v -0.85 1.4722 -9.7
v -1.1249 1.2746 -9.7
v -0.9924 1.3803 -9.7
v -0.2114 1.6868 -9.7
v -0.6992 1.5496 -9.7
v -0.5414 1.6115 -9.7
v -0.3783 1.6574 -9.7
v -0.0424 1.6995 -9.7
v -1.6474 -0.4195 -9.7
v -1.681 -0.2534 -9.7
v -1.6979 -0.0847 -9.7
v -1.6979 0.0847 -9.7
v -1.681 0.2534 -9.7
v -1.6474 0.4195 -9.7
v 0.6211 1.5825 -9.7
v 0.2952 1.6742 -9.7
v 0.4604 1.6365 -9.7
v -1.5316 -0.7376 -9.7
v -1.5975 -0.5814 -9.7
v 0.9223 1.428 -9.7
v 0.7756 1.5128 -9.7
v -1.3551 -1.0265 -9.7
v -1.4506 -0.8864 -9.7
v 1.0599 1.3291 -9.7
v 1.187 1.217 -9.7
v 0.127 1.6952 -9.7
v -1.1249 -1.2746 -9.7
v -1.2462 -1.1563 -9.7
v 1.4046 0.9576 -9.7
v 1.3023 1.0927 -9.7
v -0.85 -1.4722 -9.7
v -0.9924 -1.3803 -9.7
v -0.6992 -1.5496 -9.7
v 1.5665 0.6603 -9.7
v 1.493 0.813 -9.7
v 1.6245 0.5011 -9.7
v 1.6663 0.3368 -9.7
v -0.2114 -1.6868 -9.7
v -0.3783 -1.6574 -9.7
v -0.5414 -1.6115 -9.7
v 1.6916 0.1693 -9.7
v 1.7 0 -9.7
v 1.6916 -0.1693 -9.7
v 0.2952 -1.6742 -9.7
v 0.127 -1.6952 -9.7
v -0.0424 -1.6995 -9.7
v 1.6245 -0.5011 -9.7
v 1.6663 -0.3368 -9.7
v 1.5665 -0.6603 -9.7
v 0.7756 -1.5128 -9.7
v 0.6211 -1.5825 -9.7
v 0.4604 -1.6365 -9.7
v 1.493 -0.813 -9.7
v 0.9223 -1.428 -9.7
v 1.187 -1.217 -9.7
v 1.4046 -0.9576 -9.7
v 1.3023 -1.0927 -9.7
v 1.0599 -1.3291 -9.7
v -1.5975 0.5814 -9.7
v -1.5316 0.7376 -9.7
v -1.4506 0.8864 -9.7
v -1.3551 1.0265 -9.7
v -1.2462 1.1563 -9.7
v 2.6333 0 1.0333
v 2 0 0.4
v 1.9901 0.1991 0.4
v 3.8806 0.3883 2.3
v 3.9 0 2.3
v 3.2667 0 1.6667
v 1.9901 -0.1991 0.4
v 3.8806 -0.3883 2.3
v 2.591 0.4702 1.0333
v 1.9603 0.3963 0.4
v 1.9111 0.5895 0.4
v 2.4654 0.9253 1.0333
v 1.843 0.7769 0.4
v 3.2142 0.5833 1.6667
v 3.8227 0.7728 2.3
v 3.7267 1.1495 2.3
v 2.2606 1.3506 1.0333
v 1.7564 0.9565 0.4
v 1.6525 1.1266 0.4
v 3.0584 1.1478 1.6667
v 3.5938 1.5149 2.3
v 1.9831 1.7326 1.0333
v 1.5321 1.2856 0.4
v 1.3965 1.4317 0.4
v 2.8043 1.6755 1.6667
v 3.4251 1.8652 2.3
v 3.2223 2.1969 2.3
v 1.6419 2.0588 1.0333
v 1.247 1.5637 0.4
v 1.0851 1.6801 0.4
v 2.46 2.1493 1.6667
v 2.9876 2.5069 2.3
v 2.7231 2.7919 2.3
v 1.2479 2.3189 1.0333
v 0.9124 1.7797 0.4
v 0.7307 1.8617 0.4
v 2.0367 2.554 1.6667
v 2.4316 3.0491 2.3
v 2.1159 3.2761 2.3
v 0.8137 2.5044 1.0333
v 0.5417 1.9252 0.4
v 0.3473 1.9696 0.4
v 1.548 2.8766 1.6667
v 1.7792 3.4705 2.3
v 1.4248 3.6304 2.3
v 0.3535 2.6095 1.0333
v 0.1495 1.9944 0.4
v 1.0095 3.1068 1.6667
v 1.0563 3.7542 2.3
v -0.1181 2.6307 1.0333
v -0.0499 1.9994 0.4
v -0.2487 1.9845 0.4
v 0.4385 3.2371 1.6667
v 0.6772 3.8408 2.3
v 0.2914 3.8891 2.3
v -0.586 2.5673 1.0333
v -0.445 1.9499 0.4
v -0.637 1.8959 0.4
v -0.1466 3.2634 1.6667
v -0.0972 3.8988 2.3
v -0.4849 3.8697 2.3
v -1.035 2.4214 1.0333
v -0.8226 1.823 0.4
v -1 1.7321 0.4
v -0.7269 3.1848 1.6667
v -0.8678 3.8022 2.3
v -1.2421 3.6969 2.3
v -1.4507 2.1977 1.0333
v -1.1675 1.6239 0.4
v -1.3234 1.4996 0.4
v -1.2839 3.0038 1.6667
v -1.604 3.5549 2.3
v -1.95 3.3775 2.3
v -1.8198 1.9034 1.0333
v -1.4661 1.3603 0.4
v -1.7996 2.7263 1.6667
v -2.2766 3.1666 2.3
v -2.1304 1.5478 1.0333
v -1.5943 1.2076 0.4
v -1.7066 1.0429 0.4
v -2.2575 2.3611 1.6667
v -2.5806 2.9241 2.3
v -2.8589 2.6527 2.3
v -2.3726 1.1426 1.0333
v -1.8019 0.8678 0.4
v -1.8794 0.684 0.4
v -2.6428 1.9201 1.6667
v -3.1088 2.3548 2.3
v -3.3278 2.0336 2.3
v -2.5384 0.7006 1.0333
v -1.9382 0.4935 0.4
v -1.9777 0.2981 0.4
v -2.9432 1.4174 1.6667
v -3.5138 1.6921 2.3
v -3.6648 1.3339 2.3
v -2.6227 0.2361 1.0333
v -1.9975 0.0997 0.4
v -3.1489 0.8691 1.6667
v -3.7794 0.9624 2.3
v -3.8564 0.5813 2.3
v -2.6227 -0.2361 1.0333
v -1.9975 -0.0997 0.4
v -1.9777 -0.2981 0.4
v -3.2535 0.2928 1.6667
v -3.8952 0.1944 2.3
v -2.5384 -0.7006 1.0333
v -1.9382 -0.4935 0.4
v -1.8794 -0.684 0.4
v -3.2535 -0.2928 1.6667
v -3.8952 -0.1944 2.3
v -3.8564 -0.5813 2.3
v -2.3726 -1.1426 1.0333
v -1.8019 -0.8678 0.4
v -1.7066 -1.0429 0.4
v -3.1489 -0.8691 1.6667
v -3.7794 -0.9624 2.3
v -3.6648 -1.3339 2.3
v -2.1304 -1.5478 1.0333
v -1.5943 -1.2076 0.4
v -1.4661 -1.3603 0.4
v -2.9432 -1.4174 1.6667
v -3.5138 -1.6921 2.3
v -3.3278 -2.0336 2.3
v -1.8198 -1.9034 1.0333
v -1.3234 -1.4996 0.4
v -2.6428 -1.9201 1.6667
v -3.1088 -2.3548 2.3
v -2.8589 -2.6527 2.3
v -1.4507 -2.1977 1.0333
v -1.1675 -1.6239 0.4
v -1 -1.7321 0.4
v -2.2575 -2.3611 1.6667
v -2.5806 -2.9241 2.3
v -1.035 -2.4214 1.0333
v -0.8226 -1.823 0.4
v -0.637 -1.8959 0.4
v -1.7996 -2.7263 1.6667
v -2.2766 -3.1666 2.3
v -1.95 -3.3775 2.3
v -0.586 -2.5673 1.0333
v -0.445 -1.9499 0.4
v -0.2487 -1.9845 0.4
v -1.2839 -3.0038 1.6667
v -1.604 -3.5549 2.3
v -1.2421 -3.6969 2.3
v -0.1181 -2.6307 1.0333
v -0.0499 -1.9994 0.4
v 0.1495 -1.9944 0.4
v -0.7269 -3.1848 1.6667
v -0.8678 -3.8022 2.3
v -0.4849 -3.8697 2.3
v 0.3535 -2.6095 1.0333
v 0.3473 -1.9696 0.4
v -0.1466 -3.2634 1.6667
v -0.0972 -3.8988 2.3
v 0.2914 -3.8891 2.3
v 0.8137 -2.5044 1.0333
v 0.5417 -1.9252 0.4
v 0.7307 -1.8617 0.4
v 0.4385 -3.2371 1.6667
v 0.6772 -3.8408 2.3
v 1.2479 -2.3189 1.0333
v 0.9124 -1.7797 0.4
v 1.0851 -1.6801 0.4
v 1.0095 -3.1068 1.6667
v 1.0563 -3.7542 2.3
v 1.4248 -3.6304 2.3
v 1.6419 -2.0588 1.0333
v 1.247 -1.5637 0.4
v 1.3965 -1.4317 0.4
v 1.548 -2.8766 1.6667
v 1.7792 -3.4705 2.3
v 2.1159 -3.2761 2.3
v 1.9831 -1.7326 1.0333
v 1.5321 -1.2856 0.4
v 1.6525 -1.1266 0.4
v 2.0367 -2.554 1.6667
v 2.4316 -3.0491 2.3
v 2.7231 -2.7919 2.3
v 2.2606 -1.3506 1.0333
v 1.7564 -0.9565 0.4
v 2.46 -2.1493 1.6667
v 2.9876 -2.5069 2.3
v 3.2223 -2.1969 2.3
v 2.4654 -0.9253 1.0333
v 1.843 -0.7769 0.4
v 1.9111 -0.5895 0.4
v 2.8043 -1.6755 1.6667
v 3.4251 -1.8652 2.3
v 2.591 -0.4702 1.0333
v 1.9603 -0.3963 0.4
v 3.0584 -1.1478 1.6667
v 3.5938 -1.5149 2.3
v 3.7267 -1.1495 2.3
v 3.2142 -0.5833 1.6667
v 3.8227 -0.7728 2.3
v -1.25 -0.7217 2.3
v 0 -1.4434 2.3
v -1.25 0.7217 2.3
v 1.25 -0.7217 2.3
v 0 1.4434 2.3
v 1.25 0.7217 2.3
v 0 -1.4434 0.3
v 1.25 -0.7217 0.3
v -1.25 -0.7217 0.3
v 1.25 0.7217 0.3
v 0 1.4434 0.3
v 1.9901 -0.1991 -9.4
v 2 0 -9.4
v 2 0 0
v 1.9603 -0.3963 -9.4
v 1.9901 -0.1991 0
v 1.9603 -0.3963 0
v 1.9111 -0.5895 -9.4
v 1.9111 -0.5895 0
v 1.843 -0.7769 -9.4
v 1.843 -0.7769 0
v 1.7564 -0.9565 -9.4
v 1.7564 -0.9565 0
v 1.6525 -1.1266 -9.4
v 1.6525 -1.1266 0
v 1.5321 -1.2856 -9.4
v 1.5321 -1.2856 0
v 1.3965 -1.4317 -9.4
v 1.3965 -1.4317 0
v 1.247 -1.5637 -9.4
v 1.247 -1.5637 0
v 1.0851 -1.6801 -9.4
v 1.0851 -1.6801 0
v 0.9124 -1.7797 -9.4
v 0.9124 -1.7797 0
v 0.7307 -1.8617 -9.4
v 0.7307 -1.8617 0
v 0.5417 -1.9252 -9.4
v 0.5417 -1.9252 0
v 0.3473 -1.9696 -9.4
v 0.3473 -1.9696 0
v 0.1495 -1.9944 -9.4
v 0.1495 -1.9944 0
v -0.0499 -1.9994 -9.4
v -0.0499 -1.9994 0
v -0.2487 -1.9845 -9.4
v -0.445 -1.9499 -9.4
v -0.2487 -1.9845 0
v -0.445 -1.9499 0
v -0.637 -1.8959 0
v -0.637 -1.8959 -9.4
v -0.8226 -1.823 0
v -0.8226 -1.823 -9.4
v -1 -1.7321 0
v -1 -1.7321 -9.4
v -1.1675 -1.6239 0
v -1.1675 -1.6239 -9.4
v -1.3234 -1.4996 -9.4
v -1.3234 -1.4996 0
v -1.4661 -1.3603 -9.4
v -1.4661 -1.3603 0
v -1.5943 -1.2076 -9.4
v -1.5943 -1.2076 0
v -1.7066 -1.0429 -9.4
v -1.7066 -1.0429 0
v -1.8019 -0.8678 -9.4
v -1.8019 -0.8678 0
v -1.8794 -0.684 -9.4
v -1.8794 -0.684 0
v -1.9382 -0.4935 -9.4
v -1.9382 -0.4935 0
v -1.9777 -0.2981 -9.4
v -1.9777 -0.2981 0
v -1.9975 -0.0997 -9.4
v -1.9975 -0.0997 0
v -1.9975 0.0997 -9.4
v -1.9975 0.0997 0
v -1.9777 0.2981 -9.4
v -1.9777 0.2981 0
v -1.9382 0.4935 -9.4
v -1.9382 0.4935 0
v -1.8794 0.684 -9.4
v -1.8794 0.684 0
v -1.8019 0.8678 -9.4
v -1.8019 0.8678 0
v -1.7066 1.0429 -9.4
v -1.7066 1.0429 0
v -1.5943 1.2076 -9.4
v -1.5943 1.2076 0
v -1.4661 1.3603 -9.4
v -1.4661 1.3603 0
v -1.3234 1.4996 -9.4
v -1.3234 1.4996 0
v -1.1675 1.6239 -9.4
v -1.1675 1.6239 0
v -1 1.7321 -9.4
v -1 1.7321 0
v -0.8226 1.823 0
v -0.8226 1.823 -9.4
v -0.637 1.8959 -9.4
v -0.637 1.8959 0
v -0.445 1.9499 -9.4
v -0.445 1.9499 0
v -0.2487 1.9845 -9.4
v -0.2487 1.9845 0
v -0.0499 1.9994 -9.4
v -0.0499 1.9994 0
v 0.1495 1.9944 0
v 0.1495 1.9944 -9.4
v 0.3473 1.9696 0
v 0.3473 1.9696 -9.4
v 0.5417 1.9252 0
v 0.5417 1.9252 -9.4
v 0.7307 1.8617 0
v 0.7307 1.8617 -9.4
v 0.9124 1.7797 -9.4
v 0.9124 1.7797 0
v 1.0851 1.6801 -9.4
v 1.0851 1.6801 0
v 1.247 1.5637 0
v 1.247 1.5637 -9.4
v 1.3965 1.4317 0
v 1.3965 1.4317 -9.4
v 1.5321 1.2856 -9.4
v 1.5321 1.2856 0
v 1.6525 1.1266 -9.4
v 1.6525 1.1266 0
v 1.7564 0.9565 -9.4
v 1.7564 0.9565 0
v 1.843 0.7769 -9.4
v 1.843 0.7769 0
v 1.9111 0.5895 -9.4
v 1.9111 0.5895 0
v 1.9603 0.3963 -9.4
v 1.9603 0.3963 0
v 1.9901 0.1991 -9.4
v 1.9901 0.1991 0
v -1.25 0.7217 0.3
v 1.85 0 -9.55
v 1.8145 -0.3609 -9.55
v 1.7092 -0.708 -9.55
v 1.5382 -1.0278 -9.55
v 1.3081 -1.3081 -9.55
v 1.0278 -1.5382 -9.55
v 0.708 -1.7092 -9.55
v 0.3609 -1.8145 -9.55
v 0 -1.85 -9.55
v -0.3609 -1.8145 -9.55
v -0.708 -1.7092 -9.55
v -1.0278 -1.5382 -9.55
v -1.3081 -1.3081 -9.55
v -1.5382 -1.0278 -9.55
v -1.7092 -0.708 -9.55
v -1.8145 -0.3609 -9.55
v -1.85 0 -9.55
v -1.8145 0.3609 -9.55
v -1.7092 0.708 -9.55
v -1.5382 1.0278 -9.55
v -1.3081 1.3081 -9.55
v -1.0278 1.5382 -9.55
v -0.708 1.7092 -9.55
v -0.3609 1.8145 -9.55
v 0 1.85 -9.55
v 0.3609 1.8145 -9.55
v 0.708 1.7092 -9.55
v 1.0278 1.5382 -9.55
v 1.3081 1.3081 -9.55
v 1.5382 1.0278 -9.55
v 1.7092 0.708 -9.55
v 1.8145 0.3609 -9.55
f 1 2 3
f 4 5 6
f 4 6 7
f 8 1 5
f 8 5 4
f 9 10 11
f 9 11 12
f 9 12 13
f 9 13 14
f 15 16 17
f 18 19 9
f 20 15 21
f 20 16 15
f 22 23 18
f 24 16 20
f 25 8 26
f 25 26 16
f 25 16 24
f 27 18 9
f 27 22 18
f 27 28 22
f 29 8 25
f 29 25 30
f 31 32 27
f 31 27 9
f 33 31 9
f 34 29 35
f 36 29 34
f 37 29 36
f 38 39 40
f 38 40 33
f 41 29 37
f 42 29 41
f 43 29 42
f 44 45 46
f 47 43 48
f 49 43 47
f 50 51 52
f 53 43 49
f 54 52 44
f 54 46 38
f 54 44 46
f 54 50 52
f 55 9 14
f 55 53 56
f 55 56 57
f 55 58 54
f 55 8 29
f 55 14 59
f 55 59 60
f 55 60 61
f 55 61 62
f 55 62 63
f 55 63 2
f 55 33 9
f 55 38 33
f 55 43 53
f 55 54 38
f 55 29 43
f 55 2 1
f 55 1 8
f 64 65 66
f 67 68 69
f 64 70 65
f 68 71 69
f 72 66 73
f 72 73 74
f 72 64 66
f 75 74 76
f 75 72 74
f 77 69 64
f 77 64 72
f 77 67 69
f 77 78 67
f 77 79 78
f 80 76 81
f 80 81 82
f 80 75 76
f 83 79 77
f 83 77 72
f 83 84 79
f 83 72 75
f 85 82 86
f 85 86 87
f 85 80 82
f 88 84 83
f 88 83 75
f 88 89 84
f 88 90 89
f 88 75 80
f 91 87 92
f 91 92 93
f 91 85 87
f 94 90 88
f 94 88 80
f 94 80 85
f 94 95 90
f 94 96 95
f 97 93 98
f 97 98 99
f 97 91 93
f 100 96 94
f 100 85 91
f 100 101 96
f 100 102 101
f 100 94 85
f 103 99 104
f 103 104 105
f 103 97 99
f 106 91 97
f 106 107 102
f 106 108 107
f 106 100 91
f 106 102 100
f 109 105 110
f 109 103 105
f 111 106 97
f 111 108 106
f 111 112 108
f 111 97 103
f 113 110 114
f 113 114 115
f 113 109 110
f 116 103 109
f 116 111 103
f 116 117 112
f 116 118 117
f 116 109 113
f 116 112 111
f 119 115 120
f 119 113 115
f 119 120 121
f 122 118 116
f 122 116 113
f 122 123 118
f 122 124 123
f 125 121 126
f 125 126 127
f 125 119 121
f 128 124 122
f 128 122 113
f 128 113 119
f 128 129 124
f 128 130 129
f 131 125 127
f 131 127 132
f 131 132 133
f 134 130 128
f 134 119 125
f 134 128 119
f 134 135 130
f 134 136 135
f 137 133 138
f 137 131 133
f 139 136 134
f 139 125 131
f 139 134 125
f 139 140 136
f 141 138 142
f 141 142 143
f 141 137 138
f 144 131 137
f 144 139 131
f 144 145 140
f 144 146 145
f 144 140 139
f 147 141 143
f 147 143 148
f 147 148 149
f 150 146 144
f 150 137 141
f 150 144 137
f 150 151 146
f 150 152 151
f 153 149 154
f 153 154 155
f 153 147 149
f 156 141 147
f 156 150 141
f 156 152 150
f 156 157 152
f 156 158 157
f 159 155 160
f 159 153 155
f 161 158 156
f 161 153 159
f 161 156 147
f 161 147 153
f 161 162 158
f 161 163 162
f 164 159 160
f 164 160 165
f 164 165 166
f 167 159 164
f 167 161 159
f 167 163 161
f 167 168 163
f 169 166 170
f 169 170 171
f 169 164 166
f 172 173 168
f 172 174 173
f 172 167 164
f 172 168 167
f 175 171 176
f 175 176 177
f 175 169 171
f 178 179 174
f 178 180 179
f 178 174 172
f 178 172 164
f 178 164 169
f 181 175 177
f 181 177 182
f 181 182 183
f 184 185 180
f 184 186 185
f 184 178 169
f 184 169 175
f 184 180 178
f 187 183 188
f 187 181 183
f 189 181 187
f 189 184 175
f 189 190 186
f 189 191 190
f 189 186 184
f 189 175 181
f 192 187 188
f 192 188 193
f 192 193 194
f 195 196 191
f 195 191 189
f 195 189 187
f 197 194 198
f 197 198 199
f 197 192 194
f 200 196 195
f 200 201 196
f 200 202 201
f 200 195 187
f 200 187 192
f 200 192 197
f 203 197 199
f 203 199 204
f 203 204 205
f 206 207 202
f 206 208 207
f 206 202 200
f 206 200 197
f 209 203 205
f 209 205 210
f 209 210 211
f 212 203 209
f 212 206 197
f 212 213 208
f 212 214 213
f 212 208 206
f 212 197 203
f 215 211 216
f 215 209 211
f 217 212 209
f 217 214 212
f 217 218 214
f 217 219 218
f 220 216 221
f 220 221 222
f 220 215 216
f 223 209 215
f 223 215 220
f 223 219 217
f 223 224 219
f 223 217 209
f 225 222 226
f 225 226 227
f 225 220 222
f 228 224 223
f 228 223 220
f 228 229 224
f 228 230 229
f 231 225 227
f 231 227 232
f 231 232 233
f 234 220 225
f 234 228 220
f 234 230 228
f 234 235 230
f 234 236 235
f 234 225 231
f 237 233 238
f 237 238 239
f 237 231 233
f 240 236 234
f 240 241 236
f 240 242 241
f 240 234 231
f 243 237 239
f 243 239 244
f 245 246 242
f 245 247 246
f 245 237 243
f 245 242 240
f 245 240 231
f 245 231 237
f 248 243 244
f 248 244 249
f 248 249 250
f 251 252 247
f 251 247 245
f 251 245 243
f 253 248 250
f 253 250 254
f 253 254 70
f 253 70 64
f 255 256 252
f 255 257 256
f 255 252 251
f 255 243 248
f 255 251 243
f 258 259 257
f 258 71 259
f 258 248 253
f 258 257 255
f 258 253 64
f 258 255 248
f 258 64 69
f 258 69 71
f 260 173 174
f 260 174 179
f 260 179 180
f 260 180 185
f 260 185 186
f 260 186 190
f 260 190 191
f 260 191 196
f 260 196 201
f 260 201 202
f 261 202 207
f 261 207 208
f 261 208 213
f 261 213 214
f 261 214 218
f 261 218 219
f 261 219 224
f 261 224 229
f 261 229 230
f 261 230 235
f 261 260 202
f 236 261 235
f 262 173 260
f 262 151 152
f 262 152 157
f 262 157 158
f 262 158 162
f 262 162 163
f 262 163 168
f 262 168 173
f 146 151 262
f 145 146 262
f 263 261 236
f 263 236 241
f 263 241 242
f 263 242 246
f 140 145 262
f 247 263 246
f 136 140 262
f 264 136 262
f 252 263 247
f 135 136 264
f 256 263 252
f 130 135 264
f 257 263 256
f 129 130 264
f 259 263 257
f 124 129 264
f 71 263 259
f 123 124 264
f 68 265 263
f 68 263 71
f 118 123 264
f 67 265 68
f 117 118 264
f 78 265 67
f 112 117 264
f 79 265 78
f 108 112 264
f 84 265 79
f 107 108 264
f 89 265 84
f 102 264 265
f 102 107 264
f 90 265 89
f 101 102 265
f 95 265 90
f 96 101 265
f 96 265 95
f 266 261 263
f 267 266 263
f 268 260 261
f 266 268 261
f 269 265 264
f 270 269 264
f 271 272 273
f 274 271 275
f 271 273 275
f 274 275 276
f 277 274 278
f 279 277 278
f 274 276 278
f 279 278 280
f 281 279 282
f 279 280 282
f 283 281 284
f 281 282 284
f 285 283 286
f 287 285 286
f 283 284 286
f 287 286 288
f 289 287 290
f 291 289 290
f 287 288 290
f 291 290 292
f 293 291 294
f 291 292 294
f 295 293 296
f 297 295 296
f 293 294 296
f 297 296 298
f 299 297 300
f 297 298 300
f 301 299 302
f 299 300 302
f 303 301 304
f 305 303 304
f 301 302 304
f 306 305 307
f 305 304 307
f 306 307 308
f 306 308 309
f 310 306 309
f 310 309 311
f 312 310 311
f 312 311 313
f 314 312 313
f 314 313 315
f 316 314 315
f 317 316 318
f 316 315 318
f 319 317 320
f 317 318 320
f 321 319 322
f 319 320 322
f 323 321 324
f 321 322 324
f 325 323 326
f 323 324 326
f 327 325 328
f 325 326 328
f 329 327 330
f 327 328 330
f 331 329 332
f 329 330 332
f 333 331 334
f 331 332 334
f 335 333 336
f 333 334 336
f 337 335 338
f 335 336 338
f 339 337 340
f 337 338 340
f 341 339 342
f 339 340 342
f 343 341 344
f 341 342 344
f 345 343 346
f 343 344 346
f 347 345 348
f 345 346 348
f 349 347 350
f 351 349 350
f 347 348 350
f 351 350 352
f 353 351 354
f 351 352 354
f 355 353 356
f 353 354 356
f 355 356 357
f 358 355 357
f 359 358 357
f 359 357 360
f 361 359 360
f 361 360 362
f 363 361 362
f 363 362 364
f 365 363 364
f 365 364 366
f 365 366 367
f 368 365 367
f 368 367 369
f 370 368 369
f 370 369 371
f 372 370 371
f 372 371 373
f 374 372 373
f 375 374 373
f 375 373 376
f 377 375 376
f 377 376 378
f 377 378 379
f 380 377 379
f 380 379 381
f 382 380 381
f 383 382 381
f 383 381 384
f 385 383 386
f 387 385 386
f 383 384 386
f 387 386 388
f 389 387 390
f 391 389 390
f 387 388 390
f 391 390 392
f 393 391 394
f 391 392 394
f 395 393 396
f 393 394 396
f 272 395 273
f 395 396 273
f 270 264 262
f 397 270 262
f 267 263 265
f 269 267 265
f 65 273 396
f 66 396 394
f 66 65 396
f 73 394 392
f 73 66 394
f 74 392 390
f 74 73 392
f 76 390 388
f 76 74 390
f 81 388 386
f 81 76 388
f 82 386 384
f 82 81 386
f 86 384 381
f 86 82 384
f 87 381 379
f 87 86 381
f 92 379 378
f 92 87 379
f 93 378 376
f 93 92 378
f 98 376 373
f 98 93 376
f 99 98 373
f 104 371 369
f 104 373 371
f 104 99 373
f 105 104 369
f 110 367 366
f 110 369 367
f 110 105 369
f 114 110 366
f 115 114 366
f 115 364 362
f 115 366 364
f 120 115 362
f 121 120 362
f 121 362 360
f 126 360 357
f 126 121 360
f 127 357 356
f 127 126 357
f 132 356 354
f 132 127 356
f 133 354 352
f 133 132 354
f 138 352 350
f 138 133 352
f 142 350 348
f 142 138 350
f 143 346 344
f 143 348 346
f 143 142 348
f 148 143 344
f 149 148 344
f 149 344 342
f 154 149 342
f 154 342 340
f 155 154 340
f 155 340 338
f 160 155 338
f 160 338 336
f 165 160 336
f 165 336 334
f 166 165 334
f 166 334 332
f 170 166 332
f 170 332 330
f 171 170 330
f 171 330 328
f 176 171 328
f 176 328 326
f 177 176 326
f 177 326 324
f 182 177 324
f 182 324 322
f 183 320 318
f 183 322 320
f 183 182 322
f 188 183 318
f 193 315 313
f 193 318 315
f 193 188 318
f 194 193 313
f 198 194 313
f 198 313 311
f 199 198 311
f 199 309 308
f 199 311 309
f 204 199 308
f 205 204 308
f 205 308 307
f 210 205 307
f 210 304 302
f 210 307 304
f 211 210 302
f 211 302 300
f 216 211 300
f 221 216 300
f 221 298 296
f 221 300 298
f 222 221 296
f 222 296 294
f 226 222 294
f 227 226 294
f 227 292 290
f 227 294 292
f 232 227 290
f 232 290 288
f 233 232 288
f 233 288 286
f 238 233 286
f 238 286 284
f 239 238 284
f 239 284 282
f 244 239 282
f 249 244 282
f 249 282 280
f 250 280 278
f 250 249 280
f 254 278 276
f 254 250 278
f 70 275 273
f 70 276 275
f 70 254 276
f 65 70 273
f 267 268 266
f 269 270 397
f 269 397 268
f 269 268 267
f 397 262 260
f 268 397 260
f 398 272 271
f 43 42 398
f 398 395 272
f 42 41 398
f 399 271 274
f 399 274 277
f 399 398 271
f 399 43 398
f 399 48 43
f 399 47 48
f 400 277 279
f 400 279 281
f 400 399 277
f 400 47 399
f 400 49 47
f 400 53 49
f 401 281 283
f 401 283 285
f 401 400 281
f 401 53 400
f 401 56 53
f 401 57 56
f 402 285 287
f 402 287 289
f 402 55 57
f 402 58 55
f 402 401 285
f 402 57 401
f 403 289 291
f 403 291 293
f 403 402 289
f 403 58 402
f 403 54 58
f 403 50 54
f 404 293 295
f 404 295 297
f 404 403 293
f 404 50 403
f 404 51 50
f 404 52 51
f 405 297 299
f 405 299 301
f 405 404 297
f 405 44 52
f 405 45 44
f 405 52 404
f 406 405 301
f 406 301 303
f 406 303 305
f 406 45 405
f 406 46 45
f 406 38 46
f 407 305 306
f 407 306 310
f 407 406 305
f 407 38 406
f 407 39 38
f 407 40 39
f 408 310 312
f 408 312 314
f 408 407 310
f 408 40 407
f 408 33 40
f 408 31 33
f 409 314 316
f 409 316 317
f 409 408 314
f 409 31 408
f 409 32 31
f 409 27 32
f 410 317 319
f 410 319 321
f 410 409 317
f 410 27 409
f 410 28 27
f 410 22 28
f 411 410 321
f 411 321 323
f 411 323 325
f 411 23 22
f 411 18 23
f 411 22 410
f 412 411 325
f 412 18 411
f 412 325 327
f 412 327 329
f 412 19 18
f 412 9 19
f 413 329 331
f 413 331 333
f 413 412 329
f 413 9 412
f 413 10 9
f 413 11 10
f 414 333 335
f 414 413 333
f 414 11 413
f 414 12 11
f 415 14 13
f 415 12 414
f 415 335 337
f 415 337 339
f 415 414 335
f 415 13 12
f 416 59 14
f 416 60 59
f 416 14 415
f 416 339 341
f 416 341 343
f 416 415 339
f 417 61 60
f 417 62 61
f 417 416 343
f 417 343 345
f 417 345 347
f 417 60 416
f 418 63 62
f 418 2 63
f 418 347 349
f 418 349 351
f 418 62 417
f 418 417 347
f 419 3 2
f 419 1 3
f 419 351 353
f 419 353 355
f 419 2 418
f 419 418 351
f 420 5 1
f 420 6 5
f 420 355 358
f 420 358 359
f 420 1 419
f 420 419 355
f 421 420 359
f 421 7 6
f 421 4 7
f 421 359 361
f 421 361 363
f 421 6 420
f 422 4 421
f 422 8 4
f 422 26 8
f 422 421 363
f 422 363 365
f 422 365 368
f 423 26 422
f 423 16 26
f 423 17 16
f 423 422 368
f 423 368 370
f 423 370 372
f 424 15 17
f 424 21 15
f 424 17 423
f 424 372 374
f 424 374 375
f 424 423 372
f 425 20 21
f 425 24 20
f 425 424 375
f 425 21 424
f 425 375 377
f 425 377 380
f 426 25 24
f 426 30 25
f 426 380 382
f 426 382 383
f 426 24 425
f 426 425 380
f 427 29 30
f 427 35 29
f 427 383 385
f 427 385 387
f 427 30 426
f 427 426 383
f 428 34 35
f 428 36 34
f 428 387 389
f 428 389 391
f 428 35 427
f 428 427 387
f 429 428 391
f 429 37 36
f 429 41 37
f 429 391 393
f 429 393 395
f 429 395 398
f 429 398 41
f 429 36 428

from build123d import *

# Parameters (mm, degrees)
SKETCH1_R           = 4
BOSS_EXTRUDE1_DEPTH = 2.3
SKETCH2_R           = 2
BOSS_EXTRUDE2_DEPTH = 9.7
CHAMFER1_SIZE       = 0.3
CUT_EXTRUDE1_DEPTH  = 2
CHAMFER2_SIZE       = 2.4


with BuildPart() as part:
    # Sketch1 → Boss-Extrude1 (new body)
    with BuildSketch(Plane.XY):
        Circle(SKETCH1_R)
    extrude(amount=BOSS_EXTRUDE1_DEPTH)

    # Sketch2 → Boss-Extrude2 (add)
    with BuildSketch(Plane(origin=(0, 0, 0), x_dir=(-1, 0, 0), z_dir=(0, 0, -1))):
        with Locations(Location((0, 0, 0), (0, 0, 180))):
            Circle(SKETCH2_R)
    extrude(amount=BOSS_EXTRUDE2_DEPTH)

    # Chamfer1
    chamfer1_edges = [part.edges().sort_by_distance(p)[0] for p in [
        (-2, 0, -9.7),
    ]]
    chamfer(chamfer1_edges, length=CHAMFER1_SIZE)

    # Sketch3 → Cut-Extrude1 (cut)
    with BuildSketch(Plane.XY.offset(2.3)):
        Polygon((0, 1.443375673), (-1.25, 0.721687836), (-1.25, -0.721687836), (0, -1.443375673), (1.25, -0.721687836), (1.25, 0.721687836), align=None)
    extrude(amount=-CUT_EXTRUDE1_DEPTH, mode=Mode.SUBTRACT)

    # Chamfer2
    # the kernel refuses this chamfer: 2.4 mm, written as the material it takes off along each edge
    with BuildSketch(Plane(origin=(0, 0, 0), x_dir=(1, 0, 0), z_dir=(0, -1, 0))) as chamfer2_piece_1_section:
        Polygon((4 - CHAMFER2_SIZE, 0), (4, CHAMFER2_SIZE), (4, 0), align=None)
    chamfer2_piece_1 = revolve(axis=Axis((0, 0, 0), (0, 0, 1)), mode=Mode.PRIVATE)
    chamfer2_piece_1 = chamfer2_piece_1 - Plane(origin=(0, 0, 1.405884102), x_dir=(1, 0, 0), z_dir=(0, 0, 1)) * Cylinder(2, 16, mode=Mode.PRIVATE)
    add(chamfer2_piece_1, mode=Mode.SUBTRACT)


solid = part.part
